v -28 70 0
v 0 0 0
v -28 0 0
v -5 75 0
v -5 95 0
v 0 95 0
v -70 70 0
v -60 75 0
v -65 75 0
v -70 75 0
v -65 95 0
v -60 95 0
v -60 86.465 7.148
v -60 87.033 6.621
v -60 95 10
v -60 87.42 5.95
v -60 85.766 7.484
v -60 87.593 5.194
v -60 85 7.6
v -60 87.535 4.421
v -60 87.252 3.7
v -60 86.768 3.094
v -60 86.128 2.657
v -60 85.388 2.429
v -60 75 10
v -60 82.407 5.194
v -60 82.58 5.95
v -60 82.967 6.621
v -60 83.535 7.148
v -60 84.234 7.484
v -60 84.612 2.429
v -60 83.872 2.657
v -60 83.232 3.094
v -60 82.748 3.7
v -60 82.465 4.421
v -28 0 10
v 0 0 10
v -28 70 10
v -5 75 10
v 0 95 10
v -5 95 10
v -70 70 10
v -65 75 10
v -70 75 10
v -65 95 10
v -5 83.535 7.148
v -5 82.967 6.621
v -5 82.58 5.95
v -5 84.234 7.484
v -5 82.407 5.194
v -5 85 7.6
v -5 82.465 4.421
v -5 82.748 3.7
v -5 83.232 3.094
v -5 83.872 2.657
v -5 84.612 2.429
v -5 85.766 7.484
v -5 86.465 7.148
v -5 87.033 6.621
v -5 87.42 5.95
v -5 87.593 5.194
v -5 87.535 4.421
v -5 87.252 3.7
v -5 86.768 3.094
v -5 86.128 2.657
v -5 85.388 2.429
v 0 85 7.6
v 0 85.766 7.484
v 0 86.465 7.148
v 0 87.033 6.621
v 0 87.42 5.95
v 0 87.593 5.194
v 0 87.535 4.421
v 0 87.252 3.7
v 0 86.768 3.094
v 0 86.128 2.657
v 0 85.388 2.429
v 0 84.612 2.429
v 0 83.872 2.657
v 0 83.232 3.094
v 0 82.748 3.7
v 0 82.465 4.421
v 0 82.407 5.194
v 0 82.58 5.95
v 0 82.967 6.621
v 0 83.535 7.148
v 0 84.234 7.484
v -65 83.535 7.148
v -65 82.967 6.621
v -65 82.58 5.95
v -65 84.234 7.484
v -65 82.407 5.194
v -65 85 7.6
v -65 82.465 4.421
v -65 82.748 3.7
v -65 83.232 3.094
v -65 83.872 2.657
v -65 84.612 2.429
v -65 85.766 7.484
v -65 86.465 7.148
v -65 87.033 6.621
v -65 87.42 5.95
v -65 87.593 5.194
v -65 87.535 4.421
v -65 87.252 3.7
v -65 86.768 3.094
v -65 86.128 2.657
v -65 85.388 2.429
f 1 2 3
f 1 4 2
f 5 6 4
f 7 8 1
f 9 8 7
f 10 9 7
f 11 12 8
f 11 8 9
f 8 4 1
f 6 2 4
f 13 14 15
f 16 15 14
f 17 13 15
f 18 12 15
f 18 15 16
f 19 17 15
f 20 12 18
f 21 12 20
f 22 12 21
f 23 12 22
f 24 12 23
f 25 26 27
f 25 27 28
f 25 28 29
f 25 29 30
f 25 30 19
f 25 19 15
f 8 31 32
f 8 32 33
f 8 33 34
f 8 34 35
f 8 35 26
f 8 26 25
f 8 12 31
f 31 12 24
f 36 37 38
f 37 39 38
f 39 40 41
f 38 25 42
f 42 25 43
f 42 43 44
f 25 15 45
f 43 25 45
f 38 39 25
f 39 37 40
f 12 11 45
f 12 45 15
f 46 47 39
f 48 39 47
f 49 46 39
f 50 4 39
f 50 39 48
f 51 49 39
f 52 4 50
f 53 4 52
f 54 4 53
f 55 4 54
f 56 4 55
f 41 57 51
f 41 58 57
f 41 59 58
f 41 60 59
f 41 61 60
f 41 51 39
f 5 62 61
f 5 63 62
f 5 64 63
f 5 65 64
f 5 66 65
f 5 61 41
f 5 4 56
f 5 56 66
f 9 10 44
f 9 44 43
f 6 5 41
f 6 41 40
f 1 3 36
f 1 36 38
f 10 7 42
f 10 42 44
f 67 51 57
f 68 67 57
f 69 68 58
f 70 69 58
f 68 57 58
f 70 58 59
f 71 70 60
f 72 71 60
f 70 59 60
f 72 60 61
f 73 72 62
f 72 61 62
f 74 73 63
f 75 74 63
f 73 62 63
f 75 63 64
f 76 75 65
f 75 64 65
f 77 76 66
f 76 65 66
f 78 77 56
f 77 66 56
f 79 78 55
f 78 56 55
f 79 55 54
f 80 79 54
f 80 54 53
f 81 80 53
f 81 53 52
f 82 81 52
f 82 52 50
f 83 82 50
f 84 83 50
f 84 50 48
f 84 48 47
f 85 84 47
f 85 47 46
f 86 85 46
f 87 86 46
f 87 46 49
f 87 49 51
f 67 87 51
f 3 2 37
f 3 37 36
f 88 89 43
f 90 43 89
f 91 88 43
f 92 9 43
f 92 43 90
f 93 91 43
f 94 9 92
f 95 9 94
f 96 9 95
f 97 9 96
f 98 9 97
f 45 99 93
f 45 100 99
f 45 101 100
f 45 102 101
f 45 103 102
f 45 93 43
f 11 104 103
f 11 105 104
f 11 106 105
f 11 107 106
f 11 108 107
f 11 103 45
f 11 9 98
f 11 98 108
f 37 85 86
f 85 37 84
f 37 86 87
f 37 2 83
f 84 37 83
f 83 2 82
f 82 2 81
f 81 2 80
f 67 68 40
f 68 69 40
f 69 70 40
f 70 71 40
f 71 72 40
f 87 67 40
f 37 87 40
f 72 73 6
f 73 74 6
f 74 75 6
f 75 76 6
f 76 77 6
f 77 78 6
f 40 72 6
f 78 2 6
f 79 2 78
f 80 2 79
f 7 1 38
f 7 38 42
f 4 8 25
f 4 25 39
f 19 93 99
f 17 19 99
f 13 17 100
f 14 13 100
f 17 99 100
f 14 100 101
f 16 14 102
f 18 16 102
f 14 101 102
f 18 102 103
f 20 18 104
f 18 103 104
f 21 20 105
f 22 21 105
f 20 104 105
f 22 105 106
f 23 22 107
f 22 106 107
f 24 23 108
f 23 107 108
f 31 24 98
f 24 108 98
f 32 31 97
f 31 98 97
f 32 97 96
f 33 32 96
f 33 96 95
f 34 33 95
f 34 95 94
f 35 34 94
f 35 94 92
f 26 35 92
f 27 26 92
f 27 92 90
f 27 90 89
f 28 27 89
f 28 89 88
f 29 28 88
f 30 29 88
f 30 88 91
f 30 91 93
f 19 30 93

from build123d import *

# Parameters (mm, degrees)
EXTRUDE_1_DEPTH     = 10
SKETCH_3_R          = 2.6
CUT_EXTRUDE_1_DEPTH = 116.542200083


with BuildPart() as part:
    # ｽｹｯﾁ2 → ﾎﾞｽ - 押し出し1 (new body)
    with BuildSketch(Plane.XY):
        Polygon((-60, 75), (-5, 75), (-5, 95), (0, 95), (0, 75), (0, 70), (0, 0), (-28, 0), (-28, 70), (-70, 70), (-70, 75), (-65, 75), (-65, 95), (-60, 95), align=None)
    extrude(amount=EXTRUDE_1_DEPTH)

    # ｽｹｯﾁ3 → ｶｯﾄ - 押し出し1 (cut, through all)
    with BuildSketch(Plane.ZY.offset(65)):
        with Locations((5, 85)):
            Circle(SKETCH_3_R)
    extrude(amount=-CUT_EXTRUDE_1_DEPTH, mode=Mode.SUBTRACT)


solid = part.part
